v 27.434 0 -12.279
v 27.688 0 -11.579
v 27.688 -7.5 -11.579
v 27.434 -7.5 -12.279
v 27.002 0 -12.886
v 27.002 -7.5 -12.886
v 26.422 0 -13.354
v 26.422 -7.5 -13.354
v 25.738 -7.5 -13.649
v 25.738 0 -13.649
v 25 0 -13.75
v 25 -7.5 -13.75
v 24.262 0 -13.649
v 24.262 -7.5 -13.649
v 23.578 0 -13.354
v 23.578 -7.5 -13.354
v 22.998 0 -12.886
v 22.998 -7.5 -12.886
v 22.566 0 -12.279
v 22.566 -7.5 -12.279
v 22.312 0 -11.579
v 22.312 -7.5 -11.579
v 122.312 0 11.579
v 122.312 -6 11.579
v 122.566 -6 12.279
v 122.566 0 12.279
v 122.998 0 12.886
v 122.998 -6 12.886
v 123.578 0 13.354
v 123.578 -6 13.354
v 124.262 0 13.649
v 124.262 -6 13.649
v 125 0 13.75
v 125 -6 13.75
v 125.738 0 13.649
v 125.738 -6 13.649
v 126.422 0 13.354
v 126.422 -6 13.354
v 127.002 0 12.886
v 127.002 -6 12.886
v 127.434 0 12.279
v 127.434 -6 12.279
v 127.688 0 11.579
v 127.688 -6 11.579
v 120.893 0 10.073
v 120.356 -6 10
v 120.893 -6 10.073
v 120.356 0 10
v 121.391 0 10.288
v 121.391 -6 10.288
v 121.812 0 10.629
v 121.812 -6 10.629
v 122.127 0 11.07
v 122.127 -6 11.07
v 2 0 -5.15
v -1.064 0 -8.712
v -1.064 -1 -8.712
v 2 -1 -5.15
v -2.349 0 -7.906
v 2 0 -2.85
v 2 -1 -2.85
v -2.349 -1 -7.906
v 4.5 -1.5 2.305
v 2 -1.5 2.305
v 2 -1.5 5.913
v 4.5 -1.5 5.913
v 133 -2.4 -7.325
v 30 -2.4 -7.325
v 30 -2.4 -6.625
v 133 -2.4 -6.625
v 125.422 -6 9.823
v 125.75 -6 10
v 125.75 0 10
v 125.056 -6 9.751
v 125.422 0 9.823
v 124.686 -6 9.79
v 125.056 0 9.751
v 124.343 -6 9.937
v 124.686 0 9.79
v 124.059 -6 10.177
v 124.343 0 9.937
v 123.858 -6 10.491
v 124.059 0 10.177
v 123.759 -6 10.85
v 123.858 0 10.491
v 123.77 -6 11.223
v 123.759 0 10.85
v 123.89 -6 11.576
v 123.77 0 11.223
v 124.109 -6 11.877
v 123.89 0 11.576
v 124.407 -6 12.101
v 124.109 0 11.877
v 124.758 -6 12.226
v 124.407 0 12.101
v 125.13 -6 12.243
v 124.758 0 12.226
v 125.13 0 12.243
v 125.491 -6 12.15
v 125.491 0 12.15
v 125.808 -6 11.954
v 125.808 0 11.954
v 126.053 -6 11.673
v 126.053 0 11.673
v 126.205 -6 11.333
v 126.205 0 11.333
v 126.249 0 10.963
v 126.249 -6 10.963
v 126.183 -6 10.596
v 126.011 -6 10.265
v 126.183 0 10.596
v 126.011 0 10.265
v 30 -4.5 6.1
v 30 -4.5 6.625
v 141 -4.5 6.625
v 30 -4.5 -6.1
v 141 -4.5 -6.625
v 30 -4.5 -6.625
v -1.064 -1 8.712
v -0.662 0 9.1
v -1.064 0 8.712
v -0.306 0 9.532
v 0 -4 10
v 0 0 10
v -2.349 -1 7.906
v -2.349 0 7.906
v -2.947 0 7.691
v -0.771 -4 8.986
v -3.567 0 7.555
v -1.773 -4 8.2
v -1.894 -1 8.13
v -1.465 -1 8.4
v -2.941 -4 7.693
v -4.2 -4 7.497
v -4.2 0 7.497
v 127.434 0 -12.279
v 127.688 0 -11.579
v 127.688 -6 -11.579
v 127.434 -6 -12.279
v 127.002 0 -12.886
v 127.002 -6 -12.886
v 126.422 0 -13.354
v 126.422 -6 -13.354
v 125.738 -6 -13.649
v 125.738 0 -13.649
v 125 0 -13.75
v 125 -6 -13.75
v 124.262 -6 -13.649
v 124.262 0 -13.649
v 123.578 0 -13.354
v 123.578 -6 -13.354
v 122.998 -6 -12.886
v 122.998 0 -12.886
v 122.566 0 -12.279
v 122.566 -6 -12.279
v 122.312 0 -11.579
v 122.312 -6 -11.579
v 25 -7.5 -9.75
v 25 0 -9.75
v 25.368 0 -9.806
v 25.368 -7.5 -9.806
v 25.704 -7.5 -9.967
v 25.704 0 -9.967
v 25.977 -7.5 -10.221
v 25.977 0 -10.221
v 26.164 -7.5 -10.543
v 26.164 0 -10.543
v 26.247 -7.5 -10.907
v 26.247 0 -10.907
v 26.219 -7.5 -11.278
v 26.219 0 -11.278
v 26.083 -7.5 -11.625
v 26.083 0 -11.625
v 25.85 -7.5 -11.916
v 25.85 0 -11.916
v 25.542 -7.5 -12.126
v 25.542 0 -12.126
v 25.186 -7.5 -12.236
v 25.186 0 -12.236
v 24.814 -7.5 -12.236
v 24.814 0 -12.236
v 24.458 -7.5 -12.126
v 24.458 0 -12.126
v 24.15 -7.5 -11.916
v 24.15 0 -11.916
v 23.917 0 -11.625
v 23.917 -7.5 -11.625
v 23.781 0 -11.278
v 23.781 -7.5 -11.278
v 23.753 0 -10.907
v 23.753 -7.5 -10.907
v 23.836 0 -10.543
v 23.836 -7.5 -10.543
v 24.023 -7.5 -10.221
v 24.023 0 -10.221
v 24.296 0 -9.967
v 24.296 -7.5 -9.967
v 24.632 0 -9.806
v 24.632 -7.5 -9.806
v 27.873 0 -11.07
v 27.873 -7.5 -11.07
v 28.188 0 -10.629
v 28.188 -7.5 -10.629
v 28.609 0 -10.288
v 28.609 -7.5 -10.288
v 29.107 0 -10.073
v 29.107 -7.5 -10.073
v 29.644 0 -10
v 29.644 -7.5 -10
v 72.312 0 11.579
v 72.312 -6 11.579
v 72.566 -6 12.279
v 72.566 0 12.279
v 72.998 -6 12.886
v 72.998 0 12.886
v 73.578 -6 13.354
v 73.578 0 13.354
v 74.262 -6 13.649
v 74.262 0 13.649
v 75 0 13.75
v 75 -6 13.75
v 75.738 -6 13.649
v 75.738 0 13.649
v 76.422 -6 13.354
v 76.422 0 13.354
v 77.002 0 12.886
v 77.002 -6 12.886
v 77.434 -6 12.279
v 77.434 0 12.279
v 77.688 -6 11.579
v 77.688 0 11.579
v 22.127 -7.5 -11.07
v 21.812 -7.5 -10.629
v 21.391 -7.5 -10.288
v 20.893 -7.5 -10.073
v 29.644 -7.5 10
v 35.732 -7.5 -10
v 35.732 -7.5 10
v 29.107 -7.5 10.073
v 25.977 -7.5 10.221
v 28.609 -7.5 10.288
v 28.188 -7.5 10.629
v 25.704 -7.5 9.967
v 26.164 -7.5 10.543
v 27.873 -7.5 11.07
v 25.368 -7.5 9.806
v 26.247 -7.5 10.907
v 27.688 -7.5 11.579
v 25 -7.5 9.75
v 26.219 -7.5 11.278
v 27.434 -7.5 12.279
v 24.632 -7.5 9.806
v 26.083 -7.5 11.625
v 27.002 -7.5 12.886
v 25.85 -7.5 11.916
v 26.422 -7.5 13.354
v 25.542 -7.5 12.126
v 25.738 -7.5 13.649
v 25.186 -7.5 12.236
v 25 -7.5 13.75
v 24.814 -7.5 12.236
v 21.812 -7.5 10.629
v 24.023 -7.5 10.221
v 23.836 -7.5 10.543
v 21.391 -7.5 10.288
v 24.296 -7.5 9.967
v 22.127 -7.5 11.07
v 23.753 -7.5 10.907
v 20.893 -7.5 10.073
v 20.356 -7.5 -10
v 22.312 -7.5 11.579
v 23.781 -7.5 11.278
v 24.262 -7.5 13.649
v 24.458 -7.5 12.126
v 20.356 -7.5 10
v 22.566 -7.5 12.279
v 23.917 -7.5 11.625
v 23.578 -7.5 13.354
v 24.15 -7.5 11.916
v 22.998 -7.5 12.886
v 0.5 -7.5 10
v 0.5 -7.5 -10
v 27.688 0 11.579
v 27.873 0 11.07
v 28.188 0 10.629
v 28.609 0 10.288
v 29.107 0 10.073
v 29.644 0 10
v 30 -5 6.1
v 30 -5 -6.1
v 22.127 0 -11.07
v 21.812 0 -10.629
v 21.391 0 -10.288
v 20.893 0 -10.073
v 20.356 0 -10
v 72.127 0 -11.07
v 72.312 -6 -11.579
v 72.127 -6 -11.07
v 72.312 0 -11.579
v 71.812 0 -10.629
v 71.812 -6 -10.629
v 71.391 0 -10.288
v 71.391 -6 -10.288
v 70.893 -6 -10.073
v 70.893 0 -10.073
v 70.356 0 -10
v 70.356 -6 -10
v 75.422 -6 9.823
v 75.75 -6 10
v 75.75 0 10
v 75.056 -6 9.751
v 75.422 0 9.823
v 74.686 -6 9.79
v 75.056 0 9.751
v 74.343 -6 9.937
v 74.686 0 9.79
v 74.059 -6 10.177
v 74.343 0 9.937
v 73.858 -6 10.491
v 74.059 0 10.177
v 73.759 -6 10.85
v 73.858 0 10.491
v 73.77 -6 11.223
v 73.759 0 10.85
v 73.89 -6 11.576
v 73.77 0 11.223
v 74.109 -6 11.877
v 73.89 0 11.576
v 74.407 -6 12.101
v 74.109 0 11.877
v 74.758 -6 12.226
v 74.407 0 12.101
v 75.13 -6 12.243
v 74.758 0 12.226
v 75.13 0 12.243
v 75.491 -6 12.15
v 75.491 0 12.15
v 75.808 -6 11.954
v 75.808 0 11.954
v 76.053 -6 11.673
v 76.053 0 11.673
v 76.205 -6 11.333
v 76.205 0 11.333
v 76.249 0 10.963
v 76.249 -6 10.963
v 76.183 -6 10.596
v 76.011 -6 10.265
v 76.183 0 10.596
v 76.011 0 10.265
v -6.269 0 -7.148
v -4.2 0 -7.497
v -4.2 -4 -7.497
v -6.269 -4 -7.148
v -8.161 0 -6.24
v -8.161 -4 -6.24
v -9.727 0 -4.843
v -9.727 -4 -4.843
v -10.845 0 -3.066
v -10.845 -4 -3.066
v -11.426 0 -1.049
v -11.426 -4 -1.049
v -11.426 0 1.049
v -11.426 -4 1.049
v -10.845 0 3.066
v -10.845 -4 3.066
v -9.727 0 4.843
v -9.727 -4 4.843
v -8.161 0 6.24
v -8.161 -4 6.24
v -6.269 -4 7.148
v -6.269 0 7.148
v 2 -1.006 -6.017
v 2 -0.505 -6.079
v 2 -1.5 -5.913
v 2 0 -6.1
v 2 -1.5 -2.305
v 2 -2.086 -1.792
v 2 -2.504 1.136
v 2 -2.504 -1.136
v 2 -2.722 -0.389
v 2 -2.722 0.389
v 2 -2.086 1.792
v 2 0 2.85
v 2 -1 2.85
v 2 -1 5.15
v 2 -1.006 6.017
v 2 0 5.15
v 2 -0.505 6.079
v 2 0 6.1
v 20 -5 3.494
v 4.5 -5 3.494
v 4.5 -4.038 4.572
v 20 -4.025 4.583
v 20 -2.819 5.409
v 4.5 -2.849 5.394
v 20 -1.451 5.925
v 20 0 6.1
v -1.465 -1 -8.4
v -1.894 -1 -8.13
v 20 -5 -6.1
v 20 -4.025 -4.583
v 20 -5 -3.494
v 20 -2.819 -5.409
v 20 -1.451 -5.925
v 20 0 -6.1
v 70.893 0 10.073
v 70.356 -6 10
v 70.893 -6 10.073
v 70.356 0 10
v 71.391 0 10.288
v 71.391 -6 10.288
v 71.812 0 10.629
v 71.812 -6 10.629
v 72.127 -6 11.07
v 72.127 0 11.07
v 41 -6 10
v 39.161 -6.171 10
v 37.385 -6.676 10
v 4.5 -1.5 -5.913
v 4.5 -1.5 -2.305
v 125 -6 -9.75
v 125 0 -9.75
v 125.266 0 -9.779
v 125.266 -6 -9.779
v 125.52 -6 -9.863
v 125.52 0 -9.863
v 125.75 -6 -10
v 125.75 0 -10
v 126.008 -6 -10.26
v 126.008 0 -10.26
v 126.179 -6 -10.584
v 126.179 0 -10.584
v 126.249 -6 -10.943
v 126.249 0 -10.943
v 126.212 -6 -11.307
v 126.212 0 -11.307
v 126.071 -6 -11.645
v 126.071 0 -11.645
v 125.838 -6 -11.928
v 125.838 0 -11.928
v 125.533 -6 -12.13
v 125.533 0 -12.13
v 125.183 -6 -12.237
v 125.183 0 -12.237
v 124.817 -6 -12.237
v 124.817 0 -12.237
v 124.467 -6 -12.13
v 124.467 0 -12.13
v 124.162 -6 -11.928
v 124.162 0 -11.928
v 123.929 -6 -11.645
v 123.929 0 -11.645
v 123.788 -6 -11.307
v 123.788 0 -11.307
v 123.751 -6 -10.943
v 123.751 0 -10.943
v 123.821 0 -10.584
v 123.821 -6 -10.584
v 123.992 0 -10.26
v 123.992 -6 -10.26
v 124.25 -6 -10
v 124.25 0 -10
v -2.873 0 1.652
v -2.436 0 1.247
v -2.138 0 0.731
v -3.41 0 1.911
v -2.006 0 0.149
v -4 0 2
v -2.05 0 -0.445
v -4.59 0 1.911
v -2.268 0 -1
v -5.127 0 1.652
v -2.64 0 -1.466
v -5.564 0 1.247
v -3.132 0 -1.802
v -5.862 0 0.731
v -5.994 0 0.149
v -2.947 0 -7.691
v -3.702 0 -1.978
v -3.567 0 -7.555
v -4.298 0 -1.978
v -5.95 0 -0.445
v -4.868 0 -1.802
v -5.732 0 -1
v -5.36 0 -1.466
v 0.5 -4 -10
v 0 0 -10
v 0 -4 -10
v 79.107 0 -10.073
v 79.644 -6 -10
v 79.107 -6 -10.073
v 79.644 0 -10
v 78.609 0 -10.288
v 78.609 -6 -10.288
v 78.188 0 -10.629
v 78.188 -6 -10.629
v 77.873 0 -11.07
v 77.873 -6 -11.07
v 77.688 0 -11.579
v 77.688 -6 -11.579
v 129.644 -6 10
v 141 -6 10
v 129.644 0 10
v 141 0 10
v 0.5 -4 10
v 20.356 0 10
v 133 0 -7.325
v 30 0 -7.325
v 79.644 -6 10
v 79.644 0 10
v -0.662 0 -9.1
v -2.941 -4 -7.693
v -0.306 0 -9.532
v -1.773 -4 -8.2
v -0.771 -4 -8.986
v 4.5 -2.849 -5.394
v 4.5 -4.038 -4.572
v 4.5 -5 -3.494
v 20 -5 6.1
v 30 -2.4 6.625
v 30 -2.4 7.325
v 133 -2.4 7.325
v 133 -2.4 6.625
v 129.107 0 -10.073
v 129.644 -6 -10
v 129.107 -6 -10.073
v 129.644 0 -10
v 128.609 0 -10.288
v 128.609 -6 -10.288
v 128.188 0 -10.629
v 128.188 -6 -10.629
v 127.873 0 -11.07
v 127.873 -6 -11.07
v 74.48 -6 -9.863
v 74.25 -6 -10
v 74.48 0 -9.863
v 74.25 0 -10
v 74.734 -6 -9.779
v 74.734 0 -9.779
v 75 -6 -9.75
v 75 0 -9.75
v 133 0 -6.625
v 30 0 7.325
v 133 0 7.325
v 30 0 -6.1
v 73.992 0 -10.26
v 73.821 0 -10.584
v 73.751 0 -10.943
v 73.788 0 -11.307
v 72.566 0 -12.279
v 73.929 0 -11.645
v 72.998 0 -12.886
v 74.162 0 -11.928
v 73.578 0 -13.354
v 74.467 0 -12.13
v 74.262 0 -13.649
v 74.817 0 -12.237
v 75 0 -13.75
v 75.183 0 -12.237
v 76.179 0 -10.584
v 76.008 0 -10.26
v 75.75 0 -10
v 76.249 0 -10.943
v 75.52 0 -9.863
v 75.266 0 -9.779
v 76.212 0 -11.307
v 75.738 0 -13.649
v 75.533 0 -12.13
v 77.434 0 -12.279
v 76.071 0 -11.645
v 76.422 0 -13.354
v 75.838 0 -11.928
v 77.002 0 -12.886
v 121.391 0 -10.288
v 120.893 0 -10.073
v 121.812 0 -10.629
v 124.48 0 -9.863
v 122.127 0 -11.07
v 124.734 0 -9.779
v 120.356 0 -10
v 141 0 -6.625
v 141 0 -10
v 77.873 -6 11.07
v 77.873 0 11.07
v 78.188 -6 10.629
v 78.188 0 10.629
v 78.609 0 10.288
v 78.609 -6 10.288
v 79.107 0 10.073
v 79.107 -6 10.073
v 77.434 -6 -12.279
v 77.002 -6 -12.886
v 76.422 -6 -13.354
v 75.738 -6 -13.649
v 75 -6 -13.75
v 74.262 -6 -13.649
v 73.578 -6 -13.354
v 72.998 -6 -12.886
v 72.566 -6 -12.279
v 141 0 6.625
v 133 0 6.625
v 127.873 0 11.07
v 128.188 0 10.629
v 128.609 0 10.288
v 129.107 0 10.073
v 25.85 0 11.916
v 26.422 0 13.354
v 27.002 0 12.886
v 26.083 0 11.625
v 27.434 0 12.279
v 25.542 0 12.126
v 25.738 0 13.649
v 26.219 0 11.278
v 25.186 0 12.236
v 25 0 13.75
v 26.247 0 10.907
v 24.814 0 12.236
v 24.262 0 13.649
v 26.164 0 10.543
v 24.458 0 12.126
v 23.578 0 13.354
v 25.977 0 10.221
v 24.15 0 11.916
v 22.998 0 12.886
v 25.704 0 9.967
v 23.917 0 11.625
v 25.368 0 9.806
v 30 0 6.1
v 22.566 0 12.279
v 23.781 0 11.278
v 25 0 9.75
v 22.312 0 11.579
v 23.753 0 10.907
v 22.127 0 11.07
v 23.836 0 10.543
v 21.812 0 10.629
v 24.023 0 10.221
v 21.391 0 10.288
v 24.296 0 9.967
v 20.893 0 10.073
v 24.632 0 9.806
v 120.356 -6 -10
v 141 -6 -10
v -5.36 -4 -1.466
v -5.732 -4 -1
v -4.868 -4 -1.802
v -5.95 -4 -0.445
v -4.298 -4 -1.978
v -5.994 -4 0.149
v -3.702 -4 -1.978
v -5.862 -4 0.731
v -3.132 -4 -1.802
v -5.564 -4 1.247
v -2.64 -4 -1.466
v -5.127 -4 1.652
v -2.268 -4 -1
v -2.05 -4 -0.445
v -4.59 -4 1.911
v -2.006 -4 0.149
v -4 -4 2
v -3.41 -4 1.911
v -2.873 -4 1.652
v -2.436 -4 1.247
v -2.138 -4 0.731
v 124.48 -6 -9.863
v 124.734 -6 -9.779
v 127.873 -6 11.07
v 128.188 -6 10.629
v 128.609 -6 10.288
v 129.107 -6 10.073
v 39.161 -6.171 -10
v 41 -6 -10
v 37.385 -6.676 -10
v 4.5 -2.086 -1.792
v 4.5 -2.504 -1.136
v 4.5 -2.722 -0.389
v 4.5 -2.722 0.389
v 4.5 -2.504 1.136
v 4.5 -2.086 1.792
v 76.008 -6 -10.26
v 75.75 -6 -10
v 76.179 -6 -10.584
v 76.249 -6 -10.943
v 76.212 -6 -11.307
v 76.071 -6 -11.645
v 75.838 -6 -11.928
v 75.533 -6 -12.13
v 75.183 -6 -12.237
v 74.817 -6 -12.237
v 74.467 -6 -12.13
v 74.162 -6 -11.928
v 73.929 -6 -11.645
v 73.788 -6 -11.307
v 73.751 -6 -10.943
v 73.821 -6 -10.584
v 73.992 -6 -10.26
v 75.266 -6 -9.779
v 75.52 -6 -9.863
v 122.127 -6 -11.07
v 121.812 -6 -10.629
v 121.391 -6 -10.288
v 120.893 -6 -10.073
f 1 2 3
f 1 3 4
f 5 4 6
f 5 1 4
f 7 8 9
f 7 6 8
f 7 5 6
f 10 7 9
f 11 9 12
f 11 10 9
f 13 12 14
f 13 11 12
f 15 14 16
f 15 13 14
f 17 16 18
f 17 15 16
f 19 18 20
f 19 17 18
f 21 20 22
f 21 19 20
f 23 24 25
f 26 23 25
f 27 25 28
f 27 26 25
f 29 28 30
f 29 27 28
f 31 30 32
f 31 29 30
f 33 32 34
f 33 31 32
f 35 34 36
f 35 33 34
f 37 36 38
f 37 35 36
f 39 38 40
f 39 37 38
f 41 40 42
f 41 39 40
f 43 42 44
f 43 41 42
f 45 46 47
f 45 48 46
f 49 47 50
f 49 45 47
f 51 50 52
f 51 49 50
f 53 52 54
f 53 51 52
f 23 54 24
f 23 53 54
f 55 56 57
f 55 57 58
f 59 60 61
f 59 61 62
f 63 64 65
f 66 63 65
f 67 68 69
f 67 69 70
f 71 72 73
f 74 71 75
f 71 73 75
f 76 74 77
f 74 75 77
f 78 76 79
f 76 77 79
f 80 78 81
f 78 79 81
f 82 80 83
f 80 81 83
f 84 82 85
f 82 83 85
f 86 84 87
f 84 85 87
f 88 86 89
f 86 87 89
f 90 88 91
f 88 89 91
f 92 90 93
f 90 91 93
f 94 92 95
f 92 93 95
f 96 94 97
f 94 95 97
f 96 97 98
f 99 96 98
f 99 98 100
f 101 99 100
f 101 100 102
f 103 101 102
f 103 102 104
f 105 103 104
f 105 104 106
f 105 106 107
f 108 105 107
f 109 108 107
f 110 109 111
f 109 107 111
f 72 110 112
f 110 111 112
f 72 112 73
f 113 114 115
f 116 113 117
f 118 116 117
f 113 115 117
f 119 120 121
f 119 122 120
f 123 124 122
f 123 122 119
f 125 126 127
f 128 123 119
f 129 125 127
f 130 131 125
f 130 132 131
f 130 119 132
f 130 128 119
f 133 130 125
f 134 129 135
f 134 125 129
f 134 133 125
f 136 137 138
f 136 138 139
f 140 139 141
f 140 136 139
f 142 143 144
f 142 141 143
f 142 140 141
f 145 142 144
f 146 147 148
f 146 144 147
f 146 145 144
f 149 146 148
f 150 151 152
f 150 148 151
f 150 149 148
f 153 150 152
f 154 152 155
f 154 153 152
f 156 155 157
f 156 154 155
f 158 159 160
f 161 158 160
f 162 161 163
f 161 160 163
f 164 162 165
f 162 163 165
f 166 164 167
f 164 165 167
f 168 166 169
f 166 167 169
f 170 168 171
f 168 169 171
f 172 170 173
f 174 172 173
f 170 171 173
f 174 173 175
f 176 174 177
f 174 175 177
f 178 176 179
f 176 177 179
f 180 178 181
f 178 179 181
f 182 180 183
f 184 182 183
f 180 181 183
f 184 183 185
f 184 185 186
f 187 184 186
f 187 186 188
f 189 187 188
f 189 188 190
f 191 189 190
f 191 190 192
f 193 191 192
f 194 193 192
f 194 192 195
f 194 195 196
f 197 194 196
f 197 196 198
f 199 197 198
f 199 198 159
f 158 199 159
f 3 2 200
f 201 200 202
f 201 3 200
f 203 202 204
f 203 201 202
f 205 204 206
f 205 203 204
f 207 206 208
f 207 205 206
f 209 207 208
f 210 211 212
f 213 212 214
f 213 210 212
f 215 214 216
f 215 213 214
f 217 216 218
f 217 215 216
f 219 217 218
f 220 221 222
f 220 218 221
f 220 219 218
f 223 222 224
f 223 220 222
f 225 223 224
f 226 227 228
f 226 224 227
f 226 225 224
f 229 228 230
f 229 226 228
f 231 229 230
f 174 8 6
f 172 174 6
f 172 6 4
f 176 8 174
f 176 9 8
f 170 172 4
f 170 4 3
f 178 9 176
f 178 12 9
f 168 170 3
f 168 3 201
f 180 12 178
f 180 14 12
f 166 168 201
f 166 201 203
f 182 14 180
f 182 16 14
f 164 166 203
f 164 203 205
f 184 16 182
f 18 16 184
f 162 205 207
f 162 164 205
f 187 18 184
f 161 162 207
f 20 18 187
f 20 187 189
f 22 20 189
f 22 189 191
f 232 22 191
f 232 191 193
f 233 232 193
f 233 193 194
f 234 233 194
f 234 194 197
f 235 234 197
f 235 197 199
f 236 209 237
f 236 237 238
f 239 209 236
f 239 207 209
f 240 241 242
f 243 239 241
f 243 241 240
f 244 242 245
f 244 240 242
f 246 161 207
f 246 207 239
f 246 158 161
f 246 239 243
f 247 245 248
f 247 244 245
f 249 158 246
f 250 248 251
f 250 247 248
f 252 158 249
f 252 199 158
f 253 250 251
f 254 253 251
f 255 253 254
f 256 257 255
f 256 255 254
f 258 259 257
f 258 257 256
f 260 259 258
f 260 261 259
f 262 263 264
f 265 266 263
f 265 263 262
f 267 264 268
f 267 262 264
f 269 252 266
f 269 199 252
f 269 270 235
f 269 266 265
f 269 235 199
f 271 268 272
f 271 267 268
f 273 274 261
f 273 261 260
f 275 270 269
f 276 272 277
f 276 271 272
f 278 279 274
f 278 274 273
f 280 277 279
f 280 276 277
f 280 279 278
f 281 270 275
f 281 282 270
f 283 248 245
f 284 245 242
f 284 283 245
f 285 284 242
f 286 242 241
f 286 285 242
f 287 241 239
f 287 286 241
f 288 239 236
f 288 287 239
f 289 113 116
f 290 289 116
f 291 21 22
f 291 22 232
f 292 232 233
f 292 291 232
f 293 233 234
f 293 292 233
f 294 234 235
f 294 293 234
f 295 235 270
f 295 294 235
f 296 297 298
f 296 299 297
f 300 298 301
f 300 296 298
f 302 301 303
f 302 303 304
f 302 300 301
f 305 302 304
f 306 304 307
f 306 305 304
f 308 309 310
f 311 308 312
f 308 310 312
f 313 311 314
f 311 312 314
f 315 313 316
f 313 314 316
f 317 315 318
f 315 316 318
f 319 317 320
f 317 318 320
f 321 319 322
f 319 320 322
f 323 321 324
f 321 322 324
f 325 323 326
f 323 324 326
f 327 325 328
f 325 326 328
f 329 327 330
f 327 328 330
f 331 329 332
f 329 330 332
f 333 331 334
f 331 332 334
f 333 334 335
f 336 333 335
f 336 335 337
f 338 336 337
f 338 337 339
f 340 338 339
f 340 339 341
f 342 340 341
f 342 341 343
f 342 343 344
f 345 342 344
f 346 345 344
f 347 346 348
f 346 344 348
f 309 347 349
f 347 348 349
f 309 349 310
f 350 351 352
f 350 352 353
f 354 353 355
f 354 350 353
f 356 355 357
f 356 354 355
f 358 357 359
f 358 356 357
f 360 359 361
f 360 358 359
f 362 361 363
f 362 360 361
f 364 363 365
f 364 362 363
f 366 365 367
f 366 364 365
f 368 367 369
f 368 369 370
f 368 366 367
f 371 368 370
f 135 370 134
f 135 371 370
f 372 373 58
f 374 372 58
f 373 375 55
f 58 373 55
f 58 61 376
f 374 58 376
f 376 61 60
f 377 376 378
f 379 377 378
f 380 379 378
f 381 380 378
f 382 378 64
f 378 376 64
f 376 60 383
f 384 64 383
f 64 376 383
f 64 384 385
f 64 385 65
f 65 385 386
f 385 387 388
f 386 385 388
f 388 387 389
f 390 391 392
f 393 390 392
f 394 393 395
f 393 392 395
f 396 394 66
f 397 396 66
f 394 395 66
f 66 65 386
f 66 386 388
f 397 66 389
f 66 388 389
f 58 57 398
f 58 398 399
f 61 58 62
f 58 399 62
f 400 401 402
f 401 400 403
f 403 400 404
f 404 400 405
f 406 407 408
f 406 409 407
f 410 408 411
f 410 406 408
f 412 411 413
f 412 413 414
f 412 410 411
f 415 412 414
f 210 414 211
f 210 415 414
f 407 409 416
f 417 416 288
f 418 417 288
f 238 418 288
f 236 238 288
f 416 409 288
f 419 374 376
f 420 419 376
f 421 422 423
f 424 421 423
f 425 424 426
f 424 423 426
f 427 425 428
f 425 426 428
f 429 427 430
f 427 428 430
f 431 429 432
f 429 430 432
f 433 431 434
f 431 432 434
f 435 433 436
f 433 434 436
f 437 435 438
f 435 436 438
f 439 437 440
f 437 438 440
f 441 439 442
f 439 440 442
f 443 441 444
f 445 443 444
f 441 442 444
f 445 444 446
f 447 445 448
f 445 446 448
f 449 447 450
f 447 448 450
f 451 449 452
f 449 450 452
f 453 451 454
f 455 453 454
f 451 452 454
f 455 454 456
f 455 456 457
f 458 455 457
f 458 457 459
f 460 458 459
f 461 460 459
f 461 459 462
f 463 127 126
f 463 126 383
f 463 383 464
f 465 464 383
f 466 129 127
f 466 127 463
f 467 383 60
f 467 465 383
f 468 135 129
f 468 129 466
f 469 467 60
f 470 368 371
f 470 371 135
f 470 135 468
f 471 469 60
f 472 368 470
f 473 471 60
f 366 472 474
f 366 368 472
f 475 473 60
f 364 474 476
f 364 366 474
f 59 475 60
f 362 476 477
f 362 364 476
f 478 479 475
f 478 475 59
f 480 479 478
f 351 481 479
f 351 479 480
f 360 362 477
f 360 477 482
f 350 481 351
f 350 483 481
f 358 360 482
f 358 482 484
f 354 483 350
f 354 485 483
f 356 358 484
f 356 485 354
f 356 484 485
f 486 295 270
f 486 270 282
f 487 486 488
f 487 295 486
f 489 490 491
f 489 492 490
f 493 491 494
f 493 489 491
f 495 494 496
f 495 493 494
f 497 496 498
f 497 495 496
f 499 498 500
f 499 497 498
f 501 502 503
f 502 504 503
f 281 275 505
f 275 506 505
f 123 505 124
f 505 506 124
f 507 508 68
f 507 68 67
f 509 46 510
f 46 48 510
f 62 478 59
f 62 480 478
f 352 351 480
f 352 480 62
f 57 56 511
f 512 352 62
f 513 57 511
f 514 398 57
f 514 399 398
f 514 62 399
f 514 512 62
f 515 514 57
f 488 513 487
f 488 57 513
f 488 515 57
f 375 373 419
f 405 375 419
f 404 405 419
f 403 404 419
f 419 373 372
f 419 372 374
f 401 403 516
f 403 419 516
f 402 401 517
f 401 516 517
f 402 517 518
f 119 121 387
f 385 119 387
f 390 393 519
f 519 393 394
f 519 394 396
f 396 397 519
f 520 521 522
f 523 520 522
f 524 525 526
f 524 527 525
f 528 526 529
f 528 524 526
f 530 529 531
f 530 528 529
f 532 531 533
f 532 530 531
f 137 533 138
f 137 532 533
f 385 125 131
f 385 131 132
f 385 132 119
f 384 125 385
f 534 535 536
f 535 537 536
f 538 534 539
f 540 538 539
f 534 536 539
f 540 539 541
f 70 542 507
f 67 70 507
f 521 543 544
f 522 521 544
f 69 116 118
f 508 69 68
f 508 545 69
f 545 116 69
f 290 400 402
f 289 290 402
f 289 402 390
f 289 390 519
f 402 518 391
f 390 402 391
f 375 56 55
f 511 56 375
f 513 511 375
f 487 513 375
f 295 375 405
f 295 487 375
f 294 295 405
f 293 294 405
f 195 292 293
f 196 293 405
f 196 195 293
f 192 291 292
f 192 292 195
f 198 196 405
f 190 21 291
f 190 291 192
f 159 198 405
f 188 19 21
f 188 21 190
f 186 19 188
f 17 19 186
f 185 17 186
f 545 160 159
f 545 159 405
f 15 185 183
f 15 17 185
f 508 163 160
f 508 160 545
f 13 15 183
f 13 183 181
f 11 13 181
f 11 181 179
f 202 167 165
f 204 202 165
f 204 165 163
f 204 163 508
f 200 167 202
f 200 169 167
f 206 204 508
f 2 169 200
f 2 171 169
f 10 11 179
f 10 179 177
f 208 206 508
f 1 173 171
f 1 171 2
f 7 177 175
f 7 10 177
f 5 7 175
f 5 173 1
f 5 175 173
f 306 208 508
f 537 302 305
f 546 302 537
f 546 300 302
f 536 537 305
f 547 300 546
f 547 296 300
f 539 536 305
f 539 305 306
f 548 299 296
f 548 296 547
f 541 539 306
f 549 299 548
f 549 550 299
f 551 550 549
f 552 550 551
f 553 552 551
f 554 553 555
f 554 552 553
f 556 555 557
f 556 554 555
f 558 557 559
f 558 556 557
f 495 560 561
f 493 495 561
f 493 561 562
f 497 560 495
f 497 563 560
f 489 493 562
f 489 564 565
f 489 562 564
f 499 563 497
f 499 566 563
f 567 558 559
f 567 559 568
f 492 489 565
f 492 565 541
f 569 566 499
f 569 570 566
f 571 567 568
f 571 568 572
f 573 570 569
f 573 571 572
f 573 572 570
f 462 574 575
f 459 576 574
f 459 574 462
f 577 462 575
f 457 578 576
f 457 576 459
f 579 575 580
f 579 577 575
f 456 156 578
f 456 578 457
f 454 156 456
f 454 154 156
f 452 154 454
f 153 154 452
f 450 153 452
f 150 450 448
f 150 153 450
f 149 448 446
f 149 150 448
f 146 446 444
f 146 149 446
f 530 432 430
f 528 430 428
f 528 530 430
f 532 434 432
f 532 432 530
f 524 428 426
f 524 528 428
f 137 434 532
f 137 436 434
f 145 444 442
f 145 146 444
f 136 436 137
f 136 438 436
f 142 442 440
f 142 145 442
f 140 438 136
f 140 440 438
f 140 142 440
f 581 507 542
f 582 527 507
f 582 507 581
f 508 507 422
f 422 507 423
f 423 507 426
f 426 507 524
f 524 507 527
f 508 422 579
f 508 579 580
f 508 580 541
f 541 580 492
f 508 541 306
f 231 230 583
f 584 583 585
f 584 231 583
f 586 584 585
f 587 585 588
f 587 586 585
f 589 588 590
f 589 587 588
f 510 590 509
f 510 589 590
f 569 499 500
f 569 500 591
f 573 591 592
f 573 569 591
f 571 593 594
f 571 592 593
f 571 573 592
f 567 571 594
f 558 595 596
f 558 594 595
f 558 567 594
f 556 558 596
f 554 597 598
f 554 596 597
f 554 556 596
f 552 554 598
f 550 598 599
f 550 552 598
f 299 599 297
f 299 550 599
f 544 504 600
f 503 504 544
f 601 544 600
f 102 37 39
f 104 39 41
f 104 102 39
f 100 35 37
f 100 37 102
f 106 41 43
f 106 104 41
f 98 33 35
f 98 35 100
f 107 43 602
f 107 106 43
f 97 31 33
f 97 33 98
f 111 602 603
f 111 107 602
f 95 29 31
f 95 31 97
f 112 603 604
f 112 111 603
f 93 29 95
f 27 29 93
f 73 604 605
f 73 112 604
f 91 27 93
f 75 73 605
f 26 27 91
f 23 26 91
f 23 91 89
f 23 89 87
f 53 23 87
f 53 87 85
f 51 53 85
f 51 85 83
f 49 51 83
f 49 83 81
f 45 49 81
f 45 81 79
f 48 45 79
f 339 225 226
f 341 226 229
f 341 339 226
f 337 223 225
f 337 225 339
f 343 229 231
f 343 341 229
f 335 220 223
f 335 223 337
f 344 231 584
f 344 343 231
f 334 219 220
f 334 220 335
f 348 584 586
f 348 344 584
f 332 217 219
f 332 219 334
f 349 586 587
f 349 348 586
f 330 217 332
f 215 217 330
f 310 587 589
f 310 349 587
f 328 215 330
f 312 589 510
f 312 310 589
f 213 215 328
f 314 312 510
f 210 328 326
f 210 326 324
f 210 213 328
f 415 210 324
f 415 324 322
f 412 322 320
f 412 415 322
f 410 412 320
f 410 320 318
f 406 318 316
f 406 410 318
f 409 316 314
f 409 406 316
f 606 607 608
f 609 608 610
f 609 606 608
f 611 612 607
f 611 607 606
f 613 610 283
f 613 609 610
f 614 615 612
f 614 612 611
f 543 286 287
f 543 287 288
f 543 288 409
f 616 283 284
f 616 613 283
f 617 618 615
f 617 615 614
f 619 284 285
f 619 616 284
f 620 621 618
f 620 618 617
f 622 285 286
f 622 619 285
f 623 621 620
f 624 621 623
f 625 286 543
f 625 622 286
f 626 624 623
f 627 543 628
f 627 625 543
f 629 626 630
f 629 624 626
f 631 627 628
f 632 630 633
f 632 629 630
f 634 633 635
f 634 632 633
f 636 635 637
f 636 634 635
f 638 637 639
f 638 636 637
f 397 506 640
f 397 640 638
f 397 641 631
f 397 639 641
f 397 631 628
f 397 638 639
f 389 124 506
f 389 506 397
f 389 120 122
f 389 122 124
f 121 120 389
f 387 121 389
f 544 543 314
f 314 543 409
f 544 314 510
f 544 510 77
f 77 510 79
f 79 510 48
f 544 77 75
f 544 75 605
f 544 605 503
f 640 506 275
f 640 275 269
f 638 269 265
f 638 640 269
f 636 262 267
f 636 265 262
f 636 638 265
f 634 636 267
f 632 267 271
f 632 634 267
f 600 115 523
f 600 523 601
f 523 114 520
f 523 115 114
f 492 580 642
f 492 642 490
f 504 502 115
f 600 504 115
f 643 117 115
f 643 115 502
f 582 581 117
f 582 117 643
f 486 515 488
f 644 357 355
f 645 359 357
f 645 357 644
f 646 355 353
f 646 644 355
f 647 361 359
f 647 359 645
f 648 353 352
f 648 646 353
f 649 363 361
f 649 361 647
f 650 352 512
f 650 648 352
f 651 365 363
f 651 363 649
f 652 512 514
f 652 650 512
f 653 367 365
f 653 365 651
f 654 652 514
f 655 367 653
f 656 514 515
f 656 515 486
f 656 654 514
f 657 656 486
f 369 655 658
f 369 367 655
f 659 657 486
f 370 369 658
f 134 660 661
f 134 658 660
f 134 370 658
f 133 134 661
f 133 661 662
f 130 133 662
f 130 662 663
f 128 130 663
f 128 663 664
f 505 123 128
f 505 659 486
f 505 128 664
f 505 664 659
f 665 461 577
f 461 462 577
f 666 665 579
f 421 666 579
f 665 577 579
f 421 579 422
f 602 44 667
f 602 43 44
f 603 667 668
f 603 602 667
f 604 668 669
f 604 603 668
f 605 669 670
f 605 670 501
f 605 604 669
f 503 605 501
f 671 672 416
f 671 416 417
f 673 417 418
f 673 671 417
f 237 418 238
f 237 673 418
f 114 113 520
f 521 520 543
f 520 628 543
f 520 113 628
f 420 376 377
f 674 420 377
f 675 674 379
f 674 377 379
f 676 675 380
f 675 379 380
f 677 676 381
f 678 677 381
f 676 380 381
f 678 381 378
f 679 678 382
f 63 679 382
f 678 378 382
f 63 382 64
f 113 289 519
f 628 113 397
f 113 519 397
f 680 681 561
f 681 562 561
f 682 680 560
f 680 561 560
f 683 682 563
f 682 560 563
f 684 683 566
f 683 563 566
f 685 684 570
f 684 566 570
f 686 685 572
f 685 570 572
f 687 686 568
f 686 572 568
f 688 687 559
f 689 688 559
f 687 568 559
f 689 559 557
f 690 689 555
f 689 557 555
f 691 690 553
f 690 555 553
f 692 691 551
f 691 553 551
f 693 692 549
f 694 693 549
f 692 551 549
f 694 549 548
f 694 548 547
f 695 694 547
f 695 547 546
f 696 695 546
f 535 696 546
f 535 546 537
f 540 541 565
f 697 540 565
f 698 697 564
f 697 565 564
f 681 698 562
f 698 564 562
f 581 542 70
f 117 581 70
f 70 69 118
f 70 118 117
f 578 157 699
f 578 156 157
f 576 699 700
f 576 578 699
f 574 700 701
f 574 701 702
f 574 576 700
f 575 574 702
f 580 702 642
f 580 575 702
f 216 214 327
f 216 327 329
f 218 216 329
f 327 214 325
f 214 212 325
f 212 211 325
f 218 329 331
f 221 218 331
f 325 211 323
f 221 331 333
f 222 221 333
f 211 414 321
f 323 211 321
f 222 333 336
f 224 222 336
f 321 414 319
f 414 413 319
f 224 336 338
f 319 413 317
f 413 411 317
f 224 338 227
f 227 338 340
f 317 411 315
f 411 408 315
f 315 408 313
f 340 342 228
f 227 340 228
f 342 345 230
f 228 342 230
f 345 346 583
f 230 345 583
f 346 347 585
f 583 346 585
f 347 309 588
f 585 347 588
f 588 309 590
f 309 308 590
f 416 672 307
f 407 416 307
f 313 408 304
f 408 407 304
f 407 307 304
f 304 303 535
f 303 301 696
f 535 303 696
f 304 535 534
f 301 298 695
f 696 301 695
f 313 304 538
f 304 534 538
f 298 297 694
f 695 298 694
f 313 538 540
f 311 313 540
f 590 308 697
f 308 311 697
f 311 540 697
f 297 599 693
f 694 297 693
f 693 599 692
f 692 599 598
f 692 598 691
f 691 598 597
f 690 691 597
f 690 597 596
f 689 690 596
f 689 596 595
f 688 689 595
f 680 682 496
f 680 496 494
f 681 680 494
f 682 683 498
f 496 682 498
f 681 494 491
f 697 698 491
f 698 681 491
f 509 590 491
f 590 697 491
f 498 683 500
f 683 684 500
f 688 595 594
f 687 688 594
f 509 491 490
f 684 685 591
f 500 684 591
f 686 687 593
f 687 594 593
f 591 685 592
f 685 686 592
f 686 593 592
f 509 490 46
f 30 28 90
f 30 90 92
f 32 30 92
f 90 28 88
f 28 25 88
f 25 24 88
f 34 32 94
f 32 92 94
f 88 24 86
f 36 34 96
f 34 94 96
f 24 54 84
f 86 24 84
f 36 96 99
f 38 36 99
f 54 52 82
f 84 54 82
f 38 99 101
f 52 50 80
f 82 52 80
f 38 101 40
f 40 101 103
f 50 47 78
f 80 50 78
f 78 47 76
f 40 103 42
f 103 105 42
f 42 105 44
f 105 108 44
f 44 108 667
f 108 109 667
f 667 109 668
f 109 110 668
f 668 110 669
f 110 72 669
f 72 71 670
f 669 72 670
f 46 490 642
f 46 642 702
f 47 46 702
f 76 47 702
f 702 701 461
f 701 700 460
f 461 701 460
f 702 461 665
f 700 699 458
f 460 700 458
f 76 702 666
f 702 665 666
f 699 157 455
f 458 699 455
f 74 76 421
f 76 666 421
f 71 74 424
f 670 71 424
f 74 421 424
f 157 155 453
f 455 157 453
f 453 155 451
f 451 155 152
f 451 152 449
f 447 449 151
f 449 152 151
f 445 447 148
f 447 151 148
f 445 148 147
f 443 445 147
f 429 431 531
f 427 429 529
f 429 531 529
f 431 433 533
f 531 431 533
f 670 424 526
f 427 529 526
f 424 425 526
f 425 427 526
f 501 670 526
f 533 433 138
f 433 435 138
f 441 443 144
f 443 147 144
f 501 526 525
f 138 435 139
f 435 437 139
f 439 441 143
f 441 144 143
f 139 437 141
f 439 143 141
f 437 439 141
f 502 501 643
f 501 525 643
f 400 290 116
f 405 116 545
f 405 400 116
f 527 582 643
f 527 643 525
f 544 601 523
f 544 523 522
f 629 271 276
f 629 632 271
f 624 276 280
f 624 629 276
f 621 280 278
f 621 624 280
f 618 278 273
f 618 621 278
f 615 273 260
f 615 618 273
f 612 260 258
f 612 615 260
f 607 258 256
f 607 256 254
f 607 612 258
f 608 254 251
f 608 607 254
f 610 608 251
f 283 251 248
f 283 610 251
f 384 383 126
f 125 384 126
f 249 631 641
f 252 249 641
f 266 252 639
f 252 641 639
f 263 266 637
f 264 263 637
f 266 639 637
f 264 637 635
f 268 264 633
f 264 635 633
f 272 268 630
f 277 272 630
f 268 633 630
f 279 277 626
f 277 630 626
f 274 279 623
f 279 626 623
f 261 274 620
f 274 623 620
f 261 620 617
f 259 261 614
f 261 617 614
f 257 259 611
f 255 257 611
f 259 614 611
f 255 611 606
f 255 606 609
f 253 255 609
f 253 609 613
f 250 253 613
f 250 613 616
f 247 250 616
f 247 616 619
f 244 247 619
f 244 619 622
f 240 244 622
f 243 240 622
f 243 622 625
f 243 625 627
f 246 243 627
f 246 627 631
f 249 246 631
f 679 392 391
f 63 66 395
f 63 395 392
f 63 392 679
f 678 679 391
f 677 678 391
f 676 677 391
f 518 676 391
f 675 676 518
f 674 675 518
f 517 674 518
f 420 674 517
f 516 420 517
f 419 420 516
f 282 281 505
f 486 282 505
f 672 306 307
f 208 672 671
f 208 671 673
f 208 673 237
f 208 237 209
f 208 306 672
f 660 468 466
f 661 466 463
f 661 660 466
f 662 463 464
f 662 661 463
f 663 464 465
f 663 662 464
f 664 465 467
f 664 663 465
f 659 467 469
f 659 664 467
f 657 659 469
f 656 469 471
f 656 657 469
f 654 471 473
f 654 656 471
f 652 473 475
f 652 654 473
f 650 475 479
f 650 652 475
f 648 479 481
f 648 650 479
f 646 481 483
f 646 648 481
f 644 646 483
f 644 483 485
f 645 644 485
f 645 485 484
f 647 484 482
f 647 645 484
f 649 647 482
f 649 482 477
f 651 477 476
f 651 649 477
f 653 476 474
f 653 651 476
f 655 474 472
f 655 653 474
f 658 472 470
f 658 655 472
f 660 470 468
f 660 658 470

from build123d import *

# Parameters (mm, degrees)
SKETCH1_R                = 2
BOSS_EXTRUDE1_DEPTH      = 4
BOSS_EXTRUDE2_DEPTH      = 6
CUT_EXTRUDE1_START       = -2
CUT_EXTRUDE1_DEPTH       = 18
SKETCH4_W                = 12.2
SKETCH4_H                = 11
CUT_EXTRUDE2_DEPTH       = 10
SKETCH5_W                = 20
SKETCH5_H                = 2
BOSS_EXTRUDE3_DEPTH      = 35
CUT_EXTRUDE7_DEPTH       = 112.736296699
SKETCH14_W               = 20
SKETCH14_H               = 2
CUT_EXTRUDE8_DEPTH       = 142.58036587
FILLET2_R                = 10
FILLET3_R                = 5
CUT_EXTRUDE10_DEPTH      = 142.58036587
CUT_EXTRUDE10_DEPTH_BACK = 142.58036587
SKETCH20_W               = 20
SKETCH20_H               = 4
BOSS_EXTRUDE5_DEPTH      = 2.5
CUT_EXTRUDE11_DEPTH      = 1
SKETCH26_W               = 13.25
SKETCH26_H               = 0.5
BOSS_EXTRUDE6_DEPTH      = 111
SKETCH31_R               = 2.75
SKETCH31_R_2             = 1.25
BOSS_EXTRUDE8_DEPTH      = 8
SKETCH31_5_R             = 2.75
SKETCH31_5_R_2           = 1.25
BOSS_EXTRUDE9_DEPTH      = 6
SKETCH33_R               = 1.25
CUT_EXTRUDE12_DEPTH      = 142.894547112
FILLET4_R                = 2
SKETCH34_W               = 103
SKETCH34_H               = 0.7
CUT_EXTRUDE13_DEPTH      = 2.4
CUT_EXTRUDE14_REACH      = 143.895
SKETCH35_W               = 27.5
SKETCH35_H               = 0.5
CUT_EXTRUDE15_REACH      = 145.183
SKETCH36_W               = 0.5
SKETCH36_H               = 3.5


with BuildPart() as part:
    # Sketch1 → Boss-Extrude1 (new, symmetric)
    with BuildSketch(Plane(origin=(0, 0, 0), x_dir=(1, 0, 0), z_dir=(0, 1, 0))):
        with BuildLine():
            ThreePointArc((-4, 7.5), (-11.5, 0), (-4, -7.5))
            Line((-4, -7.5), (0, -7.5))
            Line((0, -7.5), (0, 7.5))
            Line((0, 7.5), (-4, 7.5))
        make_face()
        with Locations(Location((-4, 0, 0), (0, 0, 270))):
            Circle(SKETCH1_R, mode=Mode.SUBTRACT)
    extrude(amount=BOSS_EXTRUDE1_DEPTH, both=True)

    # Sketch1<3> → Boss-Extrude2 (add, symmetric)
    with BuildSketch(Plane(origin=(0, 0, 0), x_dir=(1, 0, 0), z_dir=(0, 1, 0))):
        Polygon((0, 10), (0, 7.5), (0, 0), (141, 0), (141, 10), align=None)
        Polygon((0, 0), (0, -7.5), (0, -10), (141, -10), (141, 0), align=None)
    extrude(amount=BOSS_EXTRUDE2_DEPTH, both=True)

    # Sketch3 → Cut-Extrude1 (cut)
    with BuildSketch(Plane.ZY.offset(CUT_EXTRUDE1_START)):
        with BuildLine():
            Line((-3.494281042, -5), (3.494281042, -5))
            ThreePointArc((3.494281042, -5), (5.4094877, -2.819120931), (6.1, 0))
            Line((6.1, 0), (6.1, 6))
            Line((6.1, 6), (-6.1, 6))
            Line((-6.1, 6), (-6.1, 0))
            ThreePointArc((-6.1, 0), (-5.4094877, -2.819120931), (-3.494281042, -5))
        make_face()
    extrude(amount=-CUT_EXTRUDE1_DEPTH, mode=Mode.SUBTRACT)

    # Sketch4 → Cut-Extrude2 (cut)
    with BuildSketch(Plane.ZY.offset(-20)):
        with Locations((0, 0.5)):
            Rectangle(SKETCH4_W, SKETCH4_H)
    extrude(amount=-CUT_EXTRUDE2_DEPTH, mode=Mode.SUBTRACT)

    # Sketch5 → Boss-Extrude3 (add)
    with BuildSketch(Plane.ZY):
        with Locations((0, -7)):
            Rectangle(SKETCH5_W, SKETCH5_H)
    extrude(amount=-BOSS_EXTRUDE3_DEPTH)

    # Sketch13 → Cut-Extrude7 (cut, through all)
    with BuildSketch(Plane.ZY.offset(-30)):
        Polygon((-6.625, 5), (-6.625, -1), (-6.625, -5), (6.625, -5), (6.625, -1), (6.625, 5), align=None)
    extrude(amount=-CUT_EXTRUDE7_DEPTH, mode=Mode.SUBTRACT)

    # Sketch14 → Cut-Extrude8 (cut, through all)
    with BuildSketch(Plane.ZY):
        with Locations((0, 5)):
            Rectangle(SKETCH14_W, SKETCH14_H)
    extrude(amount=-CUT_EXTRUDE8_DEPTH, mode=Mode.SUBTRACT)

    # Fillet2
    # the kernel refuses this fillet: 10 mm, written as the material it adds along each edge
    with BuildSketch(Plane(origin=(35, -6, -10), x_dir=(1, 0, 0), z_dir=(0, 0, 1))) as fillet2_piece_1:
        with BuildLine():
            CenterArc((6, -10), FILLET2_R, 90, 36.869897646)
            Line((0, -2), (-0.12, -1.84))
            ThreePointArc((-0.12, -1.84), (-0.2, -1), (-0.2, 0))
            Line((-0.2, 0), (0, 0.2))
            Line((0, 0.2), (6, 0.2))
            Line((6, 0.2), (6, 0))
        make_face()
    extrude(amount=20)

    # Fillet3
    # the kernel refuses this fillet: 5 mm, written as the material it adds along each edge
    with BuildSketch(Plane(origin=(0, -4, 7.5), x_dir=(0, 0, 1), z_dir=(0, 1, 0))) as fillet3_piece_1:
        with BuildLine():
            CenterArc((4.995572165, -4.332680414), FILLET3_R, 119.941428639, 58.533496592)
            Line((-0.002656701, -4.199608248), (-0.502479587, -4.186301032))
            ThreePointArc((-0.502479587, -4.186301032), (-0.5, -4), (-0.5, 0))
            Line((-0.5, 0), (0, 0.5))
            ThreePointArc((0, 0.5), (1.25, 0.5), (2.250442783, 0.433268041))
            Line((2.250442783, 0.433268041), (2.5, 0))
        make_face()
    extrude(amount=8)
    with BuildSketch(Plane(origin=(0, -4, -7.5), x_dir=(0, 0, -1), z_dir=(0, 1, 0))) as fillet3_piece_2:
        with BuildLine():
            CenterArc((4.995572165, 4.332680414), FILLET3_R, 181.525074769, 58.533496592)
            Line((-0.002656701, 4.199608248), (-0.502479587, 4.186301032))
            ThreePointArc((-0.502479587, 4.186301032), (-0.5, 4), (-0.5, 0))
            Line((-0.5, 0), (0, -0.5))
            ThreePointArc((0, -0.5), (1.25, -0.5), (2.250442783, -0.433268041))
            Line((2.250442783, -0.433268041), (2.5, 0))
        make_face()
    extrude(amount=8)

    # Sketch20 → Cut-Extrude10 (cut, two sides: drawn at the far end of the back side and taken through both)
    with BuildSketch(Plane(origin=(0, 0, 0), x_dir=(0, 0, -1), z_dir=(1, 0, 0)).offset(-CUT_EXTRUDE10_DEPTH_BACK)):
        with Locations((0, 2)):
            Rectangle(SKETCH20_W, SKETCH20_H)
    extrude(amount=CUT_EXTRUDE10_DEPTH + CUT_EXTRUDE10_DEPTH_BACK, mode=Mode.SUBTRACT)

    # Sketch16 → Boss-Extrude5 (add)
    with BuildSketch(Plane(origin=(2, 0, 0), x_dir=(0, 0, -1), z_dir=(1, 0, 0))):
        with BuildLine():
            Line((-2.304886114, -1.5), (-5.9126982, -1.5))
            ThreePointArc((-5.9126982, -1.5), (-5.018497246, -3.467662813), (-3.494281042, -5))
            Line((-3.494281042, -5), (3.494281042, -5))
            ThreePointArc((3.494281042, -5), (5.018497246, -3.467662813), (5.9126982, -1.5))
            Line((5.9126982, -1.5), (2.304886114, -1.5))
            ThreePointArc((2.304886114, -1.5), (0, -2.75), (-2.304886114, -1.5))
        make_face()
    extrude(amount=BOSS_EXTRUDE5_DEPTH)

    # Sketch22 → Cut-Extrude11 (cut)
    with BuildSketch(Plane(origin=(0, 0, 0), x_dir=(1, 0, 0), z_dir=(0, 1, 0))):
        Polygon((2, 5.15), (2, 2.85), (-2.349469206, 7.905705794), (-1.064221101, 8.711768032), align=None)
        Polygon((2, -5.15), (2, -2.85), (-2.349469206, -7.905705794), (-1.064221101, -8.711768032), align=None)
    extrude(amount=-CUT_EXTRUDE11_DEPTH, mode=Mode.SUBTRACT)

    # Sketch26 → Boss-Extrude6 (add)
    with BuildSketch(Plane(origin=(141, 0, 0), x_dir=(0, 0, -1), z_dir=(1, 0, 0))):
        with Locations((0, -4.75)):
            Rectangle(SKETCH26_W, SKETCH26_H)
    extrude(amount=-BOSS_EXTRUDE6_DEPTH)

    # Sketch31 → Boss-Extrude8 (add, through all)
    # profile 1 of 2: a face of its own
    with BuildSketch(Plane(origin=(0, 0, 0), x_dir=(1, 0, 0), z_dir=(0, 1, 0))):
        with Locations((25, 11)):
            Circle(SKETCH31_R)
        with Locations((25, 11)):
            Circle(SKETCH31_R_2, mode=Mode.SUBTRACT)
    # profile 2 of 2: a face of its own
    with BuildSketch(Plane(origin=(0, 0, 0), x_dir=(1, 0, 0), z_dir=(0, 1, 0))):
        with Locations((25, -11)):
            Circle(SKETCH31_R)
        with Locations((25, -11)):
            Circle(SKETCH31_R_2, mode=Mode.SUBTRACT)
    extrude(amount=-BOSS_EXTRUDE8_DEPTH)

    # Sketch31<5> → Boss-Extrude9 (add)
    # profile 1 of 6: a face of its own
    with BuildSketch(Plane(origin=(0, 0, 0), x_dir=(1, 0, 0), z_dir=(0, 1, 0))):
        with Locations((25, 11)):
            Circle(SKETCH31_5_R)
        with Locations((25, 11)):
            Circle(SKETCH31_5_R_2, mode=Mode.SUBTRACT)
    # profile 2 of 6: a face of its own
    with BuildSketch(Plane(origin=(0, 0, 0), x_dir=(1, 0, 0), z_dir=(0, 1, 0))):
        with Locations((75, 11)):
            Circle(SKETCH31_5_R)
        with Locations((75, 11)):
            Circle(SKETCH31_5_R_2, mode=Mode.SUBTRACT)
    # profile 3 of 6: a face of its own
    with BuildSketch(Plane(origin=(0, 0, 0), x_dir=(1, 0, 0), z_dir=(0, 1, 0))):
        with Locations((125, 11)):
            Circle(SKETCH31_5_R)
        with Locations((125, 11)):
            Circle(SKETCH31_5_R_2, mode=Mode.SUBTRACT)
    # profile 4 of 6: a face of its own
    with BuildSketch(Plane(origin=(0, 0, 0), x_dir=(1, 0, 0), z_dir=(0, 1, 0))):
        with Locations((125, -11)):
            Circle(SKETCH31_5_R)
        with Locations((125, -11)):
            Circle(SKETCH31_5_R_2, mode=Mode.SUBTRACT)
    # profile 5 of 6: a face of its own
    with BuildSketch(Plane(origin=(0, 0, 0), x_dir=(1, 0, 0), z_dir=(0, 1, 0))):
        with Locations((75, -11)):
            Circle(SKETCH31_5_R)
        with Locations((75, -11)):
            Circle(SKETCH31_5_R_2, mode=Mode.SUBTRACT)
    # profile 6 of 6: a face of its own
    with BuildSketch(Plane(origin=(0, 0, 0), x_dir=(1, 0, 0), z_dir=(0, 1, 0))):
        with Locations((25, -11)):
            Circle(SKETCH31_5_R)
        with Locations((25, -11)):
            Circle(SKETCH31_5_R_2, mode=Mode.SUBTRACT)
    extrude(amount=-BOSS_EXTRUDE9_DEPTH)

    # Sketch33 → Cut-Extrude12 (cut, through all)
    with BuildSketch(Plane(origin=(0, 0, 0), x_dir=(1, 0, 0), z_dir=(0, 1, 0))):
        with Locations(Location((25, 11, 0), (0, 0, 270))):
            Circle(SKETCH33_R)
        with Locations(Location((75, 11, 0), (0, 0, 270))):
            Circle(SKETCH33_R)
        with Locations(Location((75, -11, 0), (0, 0, 270))):
            Circle(SKETCH33_R)
        with Locations(Location((25, -11, 0), (0, 0, 90))):
            Circle(SKETCH33_R)
        with Locations(Location((125, 11, 0), (0, 0, 270))):
            Circle(SKETCH33_R)
        with Locations(Location((125, -11, 0), (0, 0, 270))):
            Circle(SKETCH33_R)
    extrude(amount=-CUT_EXTRUDE12_DEPTH, mode=Mode.SUBTRACT)

    # Fillet4
    fillet4_edges = [part.edges().sort_by_distance(p)[0] for p in [
        (27.561737691, -4, 10),
        (22.438262309, -4, 10),
        (22.438262309, -4, -10),
        (27.561737691, -4, -10),
        (72.438262309, -3, -10),
        (77.561737691, -3, -10),
        (122.438262309, -3, -10),
        (127.561737691, -3, -10),
        (127.561737691, -3, 10),
        (122.438262309, -3, 10),
        (77.561737691, -3, 10),
        (72.438262309, -3, 10),
    ]]
    fillet(fillet4_edges, radius=FILLET4_R)

    # Sketch34 → Cut-Extrude13 (cut)
    with BuildSketch(Plane(origin=(0, 0, 0), x_dir=(1, 0, 0), z_dir=(0, 1, 0))):
        with Locations((81.5, 6.975)):
            Rectangle(SKETCH34_W, SKETCH34_H)
    cut_extrude13 = extrude(amount=-CUT_EXTRUDE13_DEPTH, mode=Mode.SUBTRACT)

    # Mirror1: Cut-Extrude13 across plane
    add(cut_extrude13.mirror(Plane.XY), mode=Mode.SUBTRACT)

    # Sketch35 → Cut-Extrude14 (cut, up to next)
    with BuildSketch(Plane.ZY, mode=Mode.PRIVATE) as cut_extrude14_sk1:
        with Locations((0, -7.75)):
            Rectangle(SKETCH35_W, SKETCH35_H)
    cut_extrude14_tool1 = extrude(cut_extrude14_sk1.sketch, amount=-CUT_EXTRUDE14_REACH, mode=Mode.PRIVATE) & part.part
    add(cut_extrude14_tool1.solids().sort_by_distance((0, -7.75, 0))[0], mode=Mode.SUBTRACT)

    # Sketch36 → Cut-Extrude15 (cut, up to next)
    with BuildSketch(Plane.XY.offset(10), mode=Mode.PRIVATE) as cut_extrude15_sk1:
        with Locations((0.25, -5.75)):
            Rectangle(SKETCH36_W, SKETCH36_H)
    cut_extrude15_tool1 = extrude(cut_extrude15_sk1.sketch, amount=-CUT_EXTRUDE15_REACH, mode=Mode.PRIVATE) & part.part
    add(cut_extrude15_tool1.solids().sort_by_distance((0.25, -5.75, 10))[0], mode=Mode.SUBTRACT)


solid = part.part
